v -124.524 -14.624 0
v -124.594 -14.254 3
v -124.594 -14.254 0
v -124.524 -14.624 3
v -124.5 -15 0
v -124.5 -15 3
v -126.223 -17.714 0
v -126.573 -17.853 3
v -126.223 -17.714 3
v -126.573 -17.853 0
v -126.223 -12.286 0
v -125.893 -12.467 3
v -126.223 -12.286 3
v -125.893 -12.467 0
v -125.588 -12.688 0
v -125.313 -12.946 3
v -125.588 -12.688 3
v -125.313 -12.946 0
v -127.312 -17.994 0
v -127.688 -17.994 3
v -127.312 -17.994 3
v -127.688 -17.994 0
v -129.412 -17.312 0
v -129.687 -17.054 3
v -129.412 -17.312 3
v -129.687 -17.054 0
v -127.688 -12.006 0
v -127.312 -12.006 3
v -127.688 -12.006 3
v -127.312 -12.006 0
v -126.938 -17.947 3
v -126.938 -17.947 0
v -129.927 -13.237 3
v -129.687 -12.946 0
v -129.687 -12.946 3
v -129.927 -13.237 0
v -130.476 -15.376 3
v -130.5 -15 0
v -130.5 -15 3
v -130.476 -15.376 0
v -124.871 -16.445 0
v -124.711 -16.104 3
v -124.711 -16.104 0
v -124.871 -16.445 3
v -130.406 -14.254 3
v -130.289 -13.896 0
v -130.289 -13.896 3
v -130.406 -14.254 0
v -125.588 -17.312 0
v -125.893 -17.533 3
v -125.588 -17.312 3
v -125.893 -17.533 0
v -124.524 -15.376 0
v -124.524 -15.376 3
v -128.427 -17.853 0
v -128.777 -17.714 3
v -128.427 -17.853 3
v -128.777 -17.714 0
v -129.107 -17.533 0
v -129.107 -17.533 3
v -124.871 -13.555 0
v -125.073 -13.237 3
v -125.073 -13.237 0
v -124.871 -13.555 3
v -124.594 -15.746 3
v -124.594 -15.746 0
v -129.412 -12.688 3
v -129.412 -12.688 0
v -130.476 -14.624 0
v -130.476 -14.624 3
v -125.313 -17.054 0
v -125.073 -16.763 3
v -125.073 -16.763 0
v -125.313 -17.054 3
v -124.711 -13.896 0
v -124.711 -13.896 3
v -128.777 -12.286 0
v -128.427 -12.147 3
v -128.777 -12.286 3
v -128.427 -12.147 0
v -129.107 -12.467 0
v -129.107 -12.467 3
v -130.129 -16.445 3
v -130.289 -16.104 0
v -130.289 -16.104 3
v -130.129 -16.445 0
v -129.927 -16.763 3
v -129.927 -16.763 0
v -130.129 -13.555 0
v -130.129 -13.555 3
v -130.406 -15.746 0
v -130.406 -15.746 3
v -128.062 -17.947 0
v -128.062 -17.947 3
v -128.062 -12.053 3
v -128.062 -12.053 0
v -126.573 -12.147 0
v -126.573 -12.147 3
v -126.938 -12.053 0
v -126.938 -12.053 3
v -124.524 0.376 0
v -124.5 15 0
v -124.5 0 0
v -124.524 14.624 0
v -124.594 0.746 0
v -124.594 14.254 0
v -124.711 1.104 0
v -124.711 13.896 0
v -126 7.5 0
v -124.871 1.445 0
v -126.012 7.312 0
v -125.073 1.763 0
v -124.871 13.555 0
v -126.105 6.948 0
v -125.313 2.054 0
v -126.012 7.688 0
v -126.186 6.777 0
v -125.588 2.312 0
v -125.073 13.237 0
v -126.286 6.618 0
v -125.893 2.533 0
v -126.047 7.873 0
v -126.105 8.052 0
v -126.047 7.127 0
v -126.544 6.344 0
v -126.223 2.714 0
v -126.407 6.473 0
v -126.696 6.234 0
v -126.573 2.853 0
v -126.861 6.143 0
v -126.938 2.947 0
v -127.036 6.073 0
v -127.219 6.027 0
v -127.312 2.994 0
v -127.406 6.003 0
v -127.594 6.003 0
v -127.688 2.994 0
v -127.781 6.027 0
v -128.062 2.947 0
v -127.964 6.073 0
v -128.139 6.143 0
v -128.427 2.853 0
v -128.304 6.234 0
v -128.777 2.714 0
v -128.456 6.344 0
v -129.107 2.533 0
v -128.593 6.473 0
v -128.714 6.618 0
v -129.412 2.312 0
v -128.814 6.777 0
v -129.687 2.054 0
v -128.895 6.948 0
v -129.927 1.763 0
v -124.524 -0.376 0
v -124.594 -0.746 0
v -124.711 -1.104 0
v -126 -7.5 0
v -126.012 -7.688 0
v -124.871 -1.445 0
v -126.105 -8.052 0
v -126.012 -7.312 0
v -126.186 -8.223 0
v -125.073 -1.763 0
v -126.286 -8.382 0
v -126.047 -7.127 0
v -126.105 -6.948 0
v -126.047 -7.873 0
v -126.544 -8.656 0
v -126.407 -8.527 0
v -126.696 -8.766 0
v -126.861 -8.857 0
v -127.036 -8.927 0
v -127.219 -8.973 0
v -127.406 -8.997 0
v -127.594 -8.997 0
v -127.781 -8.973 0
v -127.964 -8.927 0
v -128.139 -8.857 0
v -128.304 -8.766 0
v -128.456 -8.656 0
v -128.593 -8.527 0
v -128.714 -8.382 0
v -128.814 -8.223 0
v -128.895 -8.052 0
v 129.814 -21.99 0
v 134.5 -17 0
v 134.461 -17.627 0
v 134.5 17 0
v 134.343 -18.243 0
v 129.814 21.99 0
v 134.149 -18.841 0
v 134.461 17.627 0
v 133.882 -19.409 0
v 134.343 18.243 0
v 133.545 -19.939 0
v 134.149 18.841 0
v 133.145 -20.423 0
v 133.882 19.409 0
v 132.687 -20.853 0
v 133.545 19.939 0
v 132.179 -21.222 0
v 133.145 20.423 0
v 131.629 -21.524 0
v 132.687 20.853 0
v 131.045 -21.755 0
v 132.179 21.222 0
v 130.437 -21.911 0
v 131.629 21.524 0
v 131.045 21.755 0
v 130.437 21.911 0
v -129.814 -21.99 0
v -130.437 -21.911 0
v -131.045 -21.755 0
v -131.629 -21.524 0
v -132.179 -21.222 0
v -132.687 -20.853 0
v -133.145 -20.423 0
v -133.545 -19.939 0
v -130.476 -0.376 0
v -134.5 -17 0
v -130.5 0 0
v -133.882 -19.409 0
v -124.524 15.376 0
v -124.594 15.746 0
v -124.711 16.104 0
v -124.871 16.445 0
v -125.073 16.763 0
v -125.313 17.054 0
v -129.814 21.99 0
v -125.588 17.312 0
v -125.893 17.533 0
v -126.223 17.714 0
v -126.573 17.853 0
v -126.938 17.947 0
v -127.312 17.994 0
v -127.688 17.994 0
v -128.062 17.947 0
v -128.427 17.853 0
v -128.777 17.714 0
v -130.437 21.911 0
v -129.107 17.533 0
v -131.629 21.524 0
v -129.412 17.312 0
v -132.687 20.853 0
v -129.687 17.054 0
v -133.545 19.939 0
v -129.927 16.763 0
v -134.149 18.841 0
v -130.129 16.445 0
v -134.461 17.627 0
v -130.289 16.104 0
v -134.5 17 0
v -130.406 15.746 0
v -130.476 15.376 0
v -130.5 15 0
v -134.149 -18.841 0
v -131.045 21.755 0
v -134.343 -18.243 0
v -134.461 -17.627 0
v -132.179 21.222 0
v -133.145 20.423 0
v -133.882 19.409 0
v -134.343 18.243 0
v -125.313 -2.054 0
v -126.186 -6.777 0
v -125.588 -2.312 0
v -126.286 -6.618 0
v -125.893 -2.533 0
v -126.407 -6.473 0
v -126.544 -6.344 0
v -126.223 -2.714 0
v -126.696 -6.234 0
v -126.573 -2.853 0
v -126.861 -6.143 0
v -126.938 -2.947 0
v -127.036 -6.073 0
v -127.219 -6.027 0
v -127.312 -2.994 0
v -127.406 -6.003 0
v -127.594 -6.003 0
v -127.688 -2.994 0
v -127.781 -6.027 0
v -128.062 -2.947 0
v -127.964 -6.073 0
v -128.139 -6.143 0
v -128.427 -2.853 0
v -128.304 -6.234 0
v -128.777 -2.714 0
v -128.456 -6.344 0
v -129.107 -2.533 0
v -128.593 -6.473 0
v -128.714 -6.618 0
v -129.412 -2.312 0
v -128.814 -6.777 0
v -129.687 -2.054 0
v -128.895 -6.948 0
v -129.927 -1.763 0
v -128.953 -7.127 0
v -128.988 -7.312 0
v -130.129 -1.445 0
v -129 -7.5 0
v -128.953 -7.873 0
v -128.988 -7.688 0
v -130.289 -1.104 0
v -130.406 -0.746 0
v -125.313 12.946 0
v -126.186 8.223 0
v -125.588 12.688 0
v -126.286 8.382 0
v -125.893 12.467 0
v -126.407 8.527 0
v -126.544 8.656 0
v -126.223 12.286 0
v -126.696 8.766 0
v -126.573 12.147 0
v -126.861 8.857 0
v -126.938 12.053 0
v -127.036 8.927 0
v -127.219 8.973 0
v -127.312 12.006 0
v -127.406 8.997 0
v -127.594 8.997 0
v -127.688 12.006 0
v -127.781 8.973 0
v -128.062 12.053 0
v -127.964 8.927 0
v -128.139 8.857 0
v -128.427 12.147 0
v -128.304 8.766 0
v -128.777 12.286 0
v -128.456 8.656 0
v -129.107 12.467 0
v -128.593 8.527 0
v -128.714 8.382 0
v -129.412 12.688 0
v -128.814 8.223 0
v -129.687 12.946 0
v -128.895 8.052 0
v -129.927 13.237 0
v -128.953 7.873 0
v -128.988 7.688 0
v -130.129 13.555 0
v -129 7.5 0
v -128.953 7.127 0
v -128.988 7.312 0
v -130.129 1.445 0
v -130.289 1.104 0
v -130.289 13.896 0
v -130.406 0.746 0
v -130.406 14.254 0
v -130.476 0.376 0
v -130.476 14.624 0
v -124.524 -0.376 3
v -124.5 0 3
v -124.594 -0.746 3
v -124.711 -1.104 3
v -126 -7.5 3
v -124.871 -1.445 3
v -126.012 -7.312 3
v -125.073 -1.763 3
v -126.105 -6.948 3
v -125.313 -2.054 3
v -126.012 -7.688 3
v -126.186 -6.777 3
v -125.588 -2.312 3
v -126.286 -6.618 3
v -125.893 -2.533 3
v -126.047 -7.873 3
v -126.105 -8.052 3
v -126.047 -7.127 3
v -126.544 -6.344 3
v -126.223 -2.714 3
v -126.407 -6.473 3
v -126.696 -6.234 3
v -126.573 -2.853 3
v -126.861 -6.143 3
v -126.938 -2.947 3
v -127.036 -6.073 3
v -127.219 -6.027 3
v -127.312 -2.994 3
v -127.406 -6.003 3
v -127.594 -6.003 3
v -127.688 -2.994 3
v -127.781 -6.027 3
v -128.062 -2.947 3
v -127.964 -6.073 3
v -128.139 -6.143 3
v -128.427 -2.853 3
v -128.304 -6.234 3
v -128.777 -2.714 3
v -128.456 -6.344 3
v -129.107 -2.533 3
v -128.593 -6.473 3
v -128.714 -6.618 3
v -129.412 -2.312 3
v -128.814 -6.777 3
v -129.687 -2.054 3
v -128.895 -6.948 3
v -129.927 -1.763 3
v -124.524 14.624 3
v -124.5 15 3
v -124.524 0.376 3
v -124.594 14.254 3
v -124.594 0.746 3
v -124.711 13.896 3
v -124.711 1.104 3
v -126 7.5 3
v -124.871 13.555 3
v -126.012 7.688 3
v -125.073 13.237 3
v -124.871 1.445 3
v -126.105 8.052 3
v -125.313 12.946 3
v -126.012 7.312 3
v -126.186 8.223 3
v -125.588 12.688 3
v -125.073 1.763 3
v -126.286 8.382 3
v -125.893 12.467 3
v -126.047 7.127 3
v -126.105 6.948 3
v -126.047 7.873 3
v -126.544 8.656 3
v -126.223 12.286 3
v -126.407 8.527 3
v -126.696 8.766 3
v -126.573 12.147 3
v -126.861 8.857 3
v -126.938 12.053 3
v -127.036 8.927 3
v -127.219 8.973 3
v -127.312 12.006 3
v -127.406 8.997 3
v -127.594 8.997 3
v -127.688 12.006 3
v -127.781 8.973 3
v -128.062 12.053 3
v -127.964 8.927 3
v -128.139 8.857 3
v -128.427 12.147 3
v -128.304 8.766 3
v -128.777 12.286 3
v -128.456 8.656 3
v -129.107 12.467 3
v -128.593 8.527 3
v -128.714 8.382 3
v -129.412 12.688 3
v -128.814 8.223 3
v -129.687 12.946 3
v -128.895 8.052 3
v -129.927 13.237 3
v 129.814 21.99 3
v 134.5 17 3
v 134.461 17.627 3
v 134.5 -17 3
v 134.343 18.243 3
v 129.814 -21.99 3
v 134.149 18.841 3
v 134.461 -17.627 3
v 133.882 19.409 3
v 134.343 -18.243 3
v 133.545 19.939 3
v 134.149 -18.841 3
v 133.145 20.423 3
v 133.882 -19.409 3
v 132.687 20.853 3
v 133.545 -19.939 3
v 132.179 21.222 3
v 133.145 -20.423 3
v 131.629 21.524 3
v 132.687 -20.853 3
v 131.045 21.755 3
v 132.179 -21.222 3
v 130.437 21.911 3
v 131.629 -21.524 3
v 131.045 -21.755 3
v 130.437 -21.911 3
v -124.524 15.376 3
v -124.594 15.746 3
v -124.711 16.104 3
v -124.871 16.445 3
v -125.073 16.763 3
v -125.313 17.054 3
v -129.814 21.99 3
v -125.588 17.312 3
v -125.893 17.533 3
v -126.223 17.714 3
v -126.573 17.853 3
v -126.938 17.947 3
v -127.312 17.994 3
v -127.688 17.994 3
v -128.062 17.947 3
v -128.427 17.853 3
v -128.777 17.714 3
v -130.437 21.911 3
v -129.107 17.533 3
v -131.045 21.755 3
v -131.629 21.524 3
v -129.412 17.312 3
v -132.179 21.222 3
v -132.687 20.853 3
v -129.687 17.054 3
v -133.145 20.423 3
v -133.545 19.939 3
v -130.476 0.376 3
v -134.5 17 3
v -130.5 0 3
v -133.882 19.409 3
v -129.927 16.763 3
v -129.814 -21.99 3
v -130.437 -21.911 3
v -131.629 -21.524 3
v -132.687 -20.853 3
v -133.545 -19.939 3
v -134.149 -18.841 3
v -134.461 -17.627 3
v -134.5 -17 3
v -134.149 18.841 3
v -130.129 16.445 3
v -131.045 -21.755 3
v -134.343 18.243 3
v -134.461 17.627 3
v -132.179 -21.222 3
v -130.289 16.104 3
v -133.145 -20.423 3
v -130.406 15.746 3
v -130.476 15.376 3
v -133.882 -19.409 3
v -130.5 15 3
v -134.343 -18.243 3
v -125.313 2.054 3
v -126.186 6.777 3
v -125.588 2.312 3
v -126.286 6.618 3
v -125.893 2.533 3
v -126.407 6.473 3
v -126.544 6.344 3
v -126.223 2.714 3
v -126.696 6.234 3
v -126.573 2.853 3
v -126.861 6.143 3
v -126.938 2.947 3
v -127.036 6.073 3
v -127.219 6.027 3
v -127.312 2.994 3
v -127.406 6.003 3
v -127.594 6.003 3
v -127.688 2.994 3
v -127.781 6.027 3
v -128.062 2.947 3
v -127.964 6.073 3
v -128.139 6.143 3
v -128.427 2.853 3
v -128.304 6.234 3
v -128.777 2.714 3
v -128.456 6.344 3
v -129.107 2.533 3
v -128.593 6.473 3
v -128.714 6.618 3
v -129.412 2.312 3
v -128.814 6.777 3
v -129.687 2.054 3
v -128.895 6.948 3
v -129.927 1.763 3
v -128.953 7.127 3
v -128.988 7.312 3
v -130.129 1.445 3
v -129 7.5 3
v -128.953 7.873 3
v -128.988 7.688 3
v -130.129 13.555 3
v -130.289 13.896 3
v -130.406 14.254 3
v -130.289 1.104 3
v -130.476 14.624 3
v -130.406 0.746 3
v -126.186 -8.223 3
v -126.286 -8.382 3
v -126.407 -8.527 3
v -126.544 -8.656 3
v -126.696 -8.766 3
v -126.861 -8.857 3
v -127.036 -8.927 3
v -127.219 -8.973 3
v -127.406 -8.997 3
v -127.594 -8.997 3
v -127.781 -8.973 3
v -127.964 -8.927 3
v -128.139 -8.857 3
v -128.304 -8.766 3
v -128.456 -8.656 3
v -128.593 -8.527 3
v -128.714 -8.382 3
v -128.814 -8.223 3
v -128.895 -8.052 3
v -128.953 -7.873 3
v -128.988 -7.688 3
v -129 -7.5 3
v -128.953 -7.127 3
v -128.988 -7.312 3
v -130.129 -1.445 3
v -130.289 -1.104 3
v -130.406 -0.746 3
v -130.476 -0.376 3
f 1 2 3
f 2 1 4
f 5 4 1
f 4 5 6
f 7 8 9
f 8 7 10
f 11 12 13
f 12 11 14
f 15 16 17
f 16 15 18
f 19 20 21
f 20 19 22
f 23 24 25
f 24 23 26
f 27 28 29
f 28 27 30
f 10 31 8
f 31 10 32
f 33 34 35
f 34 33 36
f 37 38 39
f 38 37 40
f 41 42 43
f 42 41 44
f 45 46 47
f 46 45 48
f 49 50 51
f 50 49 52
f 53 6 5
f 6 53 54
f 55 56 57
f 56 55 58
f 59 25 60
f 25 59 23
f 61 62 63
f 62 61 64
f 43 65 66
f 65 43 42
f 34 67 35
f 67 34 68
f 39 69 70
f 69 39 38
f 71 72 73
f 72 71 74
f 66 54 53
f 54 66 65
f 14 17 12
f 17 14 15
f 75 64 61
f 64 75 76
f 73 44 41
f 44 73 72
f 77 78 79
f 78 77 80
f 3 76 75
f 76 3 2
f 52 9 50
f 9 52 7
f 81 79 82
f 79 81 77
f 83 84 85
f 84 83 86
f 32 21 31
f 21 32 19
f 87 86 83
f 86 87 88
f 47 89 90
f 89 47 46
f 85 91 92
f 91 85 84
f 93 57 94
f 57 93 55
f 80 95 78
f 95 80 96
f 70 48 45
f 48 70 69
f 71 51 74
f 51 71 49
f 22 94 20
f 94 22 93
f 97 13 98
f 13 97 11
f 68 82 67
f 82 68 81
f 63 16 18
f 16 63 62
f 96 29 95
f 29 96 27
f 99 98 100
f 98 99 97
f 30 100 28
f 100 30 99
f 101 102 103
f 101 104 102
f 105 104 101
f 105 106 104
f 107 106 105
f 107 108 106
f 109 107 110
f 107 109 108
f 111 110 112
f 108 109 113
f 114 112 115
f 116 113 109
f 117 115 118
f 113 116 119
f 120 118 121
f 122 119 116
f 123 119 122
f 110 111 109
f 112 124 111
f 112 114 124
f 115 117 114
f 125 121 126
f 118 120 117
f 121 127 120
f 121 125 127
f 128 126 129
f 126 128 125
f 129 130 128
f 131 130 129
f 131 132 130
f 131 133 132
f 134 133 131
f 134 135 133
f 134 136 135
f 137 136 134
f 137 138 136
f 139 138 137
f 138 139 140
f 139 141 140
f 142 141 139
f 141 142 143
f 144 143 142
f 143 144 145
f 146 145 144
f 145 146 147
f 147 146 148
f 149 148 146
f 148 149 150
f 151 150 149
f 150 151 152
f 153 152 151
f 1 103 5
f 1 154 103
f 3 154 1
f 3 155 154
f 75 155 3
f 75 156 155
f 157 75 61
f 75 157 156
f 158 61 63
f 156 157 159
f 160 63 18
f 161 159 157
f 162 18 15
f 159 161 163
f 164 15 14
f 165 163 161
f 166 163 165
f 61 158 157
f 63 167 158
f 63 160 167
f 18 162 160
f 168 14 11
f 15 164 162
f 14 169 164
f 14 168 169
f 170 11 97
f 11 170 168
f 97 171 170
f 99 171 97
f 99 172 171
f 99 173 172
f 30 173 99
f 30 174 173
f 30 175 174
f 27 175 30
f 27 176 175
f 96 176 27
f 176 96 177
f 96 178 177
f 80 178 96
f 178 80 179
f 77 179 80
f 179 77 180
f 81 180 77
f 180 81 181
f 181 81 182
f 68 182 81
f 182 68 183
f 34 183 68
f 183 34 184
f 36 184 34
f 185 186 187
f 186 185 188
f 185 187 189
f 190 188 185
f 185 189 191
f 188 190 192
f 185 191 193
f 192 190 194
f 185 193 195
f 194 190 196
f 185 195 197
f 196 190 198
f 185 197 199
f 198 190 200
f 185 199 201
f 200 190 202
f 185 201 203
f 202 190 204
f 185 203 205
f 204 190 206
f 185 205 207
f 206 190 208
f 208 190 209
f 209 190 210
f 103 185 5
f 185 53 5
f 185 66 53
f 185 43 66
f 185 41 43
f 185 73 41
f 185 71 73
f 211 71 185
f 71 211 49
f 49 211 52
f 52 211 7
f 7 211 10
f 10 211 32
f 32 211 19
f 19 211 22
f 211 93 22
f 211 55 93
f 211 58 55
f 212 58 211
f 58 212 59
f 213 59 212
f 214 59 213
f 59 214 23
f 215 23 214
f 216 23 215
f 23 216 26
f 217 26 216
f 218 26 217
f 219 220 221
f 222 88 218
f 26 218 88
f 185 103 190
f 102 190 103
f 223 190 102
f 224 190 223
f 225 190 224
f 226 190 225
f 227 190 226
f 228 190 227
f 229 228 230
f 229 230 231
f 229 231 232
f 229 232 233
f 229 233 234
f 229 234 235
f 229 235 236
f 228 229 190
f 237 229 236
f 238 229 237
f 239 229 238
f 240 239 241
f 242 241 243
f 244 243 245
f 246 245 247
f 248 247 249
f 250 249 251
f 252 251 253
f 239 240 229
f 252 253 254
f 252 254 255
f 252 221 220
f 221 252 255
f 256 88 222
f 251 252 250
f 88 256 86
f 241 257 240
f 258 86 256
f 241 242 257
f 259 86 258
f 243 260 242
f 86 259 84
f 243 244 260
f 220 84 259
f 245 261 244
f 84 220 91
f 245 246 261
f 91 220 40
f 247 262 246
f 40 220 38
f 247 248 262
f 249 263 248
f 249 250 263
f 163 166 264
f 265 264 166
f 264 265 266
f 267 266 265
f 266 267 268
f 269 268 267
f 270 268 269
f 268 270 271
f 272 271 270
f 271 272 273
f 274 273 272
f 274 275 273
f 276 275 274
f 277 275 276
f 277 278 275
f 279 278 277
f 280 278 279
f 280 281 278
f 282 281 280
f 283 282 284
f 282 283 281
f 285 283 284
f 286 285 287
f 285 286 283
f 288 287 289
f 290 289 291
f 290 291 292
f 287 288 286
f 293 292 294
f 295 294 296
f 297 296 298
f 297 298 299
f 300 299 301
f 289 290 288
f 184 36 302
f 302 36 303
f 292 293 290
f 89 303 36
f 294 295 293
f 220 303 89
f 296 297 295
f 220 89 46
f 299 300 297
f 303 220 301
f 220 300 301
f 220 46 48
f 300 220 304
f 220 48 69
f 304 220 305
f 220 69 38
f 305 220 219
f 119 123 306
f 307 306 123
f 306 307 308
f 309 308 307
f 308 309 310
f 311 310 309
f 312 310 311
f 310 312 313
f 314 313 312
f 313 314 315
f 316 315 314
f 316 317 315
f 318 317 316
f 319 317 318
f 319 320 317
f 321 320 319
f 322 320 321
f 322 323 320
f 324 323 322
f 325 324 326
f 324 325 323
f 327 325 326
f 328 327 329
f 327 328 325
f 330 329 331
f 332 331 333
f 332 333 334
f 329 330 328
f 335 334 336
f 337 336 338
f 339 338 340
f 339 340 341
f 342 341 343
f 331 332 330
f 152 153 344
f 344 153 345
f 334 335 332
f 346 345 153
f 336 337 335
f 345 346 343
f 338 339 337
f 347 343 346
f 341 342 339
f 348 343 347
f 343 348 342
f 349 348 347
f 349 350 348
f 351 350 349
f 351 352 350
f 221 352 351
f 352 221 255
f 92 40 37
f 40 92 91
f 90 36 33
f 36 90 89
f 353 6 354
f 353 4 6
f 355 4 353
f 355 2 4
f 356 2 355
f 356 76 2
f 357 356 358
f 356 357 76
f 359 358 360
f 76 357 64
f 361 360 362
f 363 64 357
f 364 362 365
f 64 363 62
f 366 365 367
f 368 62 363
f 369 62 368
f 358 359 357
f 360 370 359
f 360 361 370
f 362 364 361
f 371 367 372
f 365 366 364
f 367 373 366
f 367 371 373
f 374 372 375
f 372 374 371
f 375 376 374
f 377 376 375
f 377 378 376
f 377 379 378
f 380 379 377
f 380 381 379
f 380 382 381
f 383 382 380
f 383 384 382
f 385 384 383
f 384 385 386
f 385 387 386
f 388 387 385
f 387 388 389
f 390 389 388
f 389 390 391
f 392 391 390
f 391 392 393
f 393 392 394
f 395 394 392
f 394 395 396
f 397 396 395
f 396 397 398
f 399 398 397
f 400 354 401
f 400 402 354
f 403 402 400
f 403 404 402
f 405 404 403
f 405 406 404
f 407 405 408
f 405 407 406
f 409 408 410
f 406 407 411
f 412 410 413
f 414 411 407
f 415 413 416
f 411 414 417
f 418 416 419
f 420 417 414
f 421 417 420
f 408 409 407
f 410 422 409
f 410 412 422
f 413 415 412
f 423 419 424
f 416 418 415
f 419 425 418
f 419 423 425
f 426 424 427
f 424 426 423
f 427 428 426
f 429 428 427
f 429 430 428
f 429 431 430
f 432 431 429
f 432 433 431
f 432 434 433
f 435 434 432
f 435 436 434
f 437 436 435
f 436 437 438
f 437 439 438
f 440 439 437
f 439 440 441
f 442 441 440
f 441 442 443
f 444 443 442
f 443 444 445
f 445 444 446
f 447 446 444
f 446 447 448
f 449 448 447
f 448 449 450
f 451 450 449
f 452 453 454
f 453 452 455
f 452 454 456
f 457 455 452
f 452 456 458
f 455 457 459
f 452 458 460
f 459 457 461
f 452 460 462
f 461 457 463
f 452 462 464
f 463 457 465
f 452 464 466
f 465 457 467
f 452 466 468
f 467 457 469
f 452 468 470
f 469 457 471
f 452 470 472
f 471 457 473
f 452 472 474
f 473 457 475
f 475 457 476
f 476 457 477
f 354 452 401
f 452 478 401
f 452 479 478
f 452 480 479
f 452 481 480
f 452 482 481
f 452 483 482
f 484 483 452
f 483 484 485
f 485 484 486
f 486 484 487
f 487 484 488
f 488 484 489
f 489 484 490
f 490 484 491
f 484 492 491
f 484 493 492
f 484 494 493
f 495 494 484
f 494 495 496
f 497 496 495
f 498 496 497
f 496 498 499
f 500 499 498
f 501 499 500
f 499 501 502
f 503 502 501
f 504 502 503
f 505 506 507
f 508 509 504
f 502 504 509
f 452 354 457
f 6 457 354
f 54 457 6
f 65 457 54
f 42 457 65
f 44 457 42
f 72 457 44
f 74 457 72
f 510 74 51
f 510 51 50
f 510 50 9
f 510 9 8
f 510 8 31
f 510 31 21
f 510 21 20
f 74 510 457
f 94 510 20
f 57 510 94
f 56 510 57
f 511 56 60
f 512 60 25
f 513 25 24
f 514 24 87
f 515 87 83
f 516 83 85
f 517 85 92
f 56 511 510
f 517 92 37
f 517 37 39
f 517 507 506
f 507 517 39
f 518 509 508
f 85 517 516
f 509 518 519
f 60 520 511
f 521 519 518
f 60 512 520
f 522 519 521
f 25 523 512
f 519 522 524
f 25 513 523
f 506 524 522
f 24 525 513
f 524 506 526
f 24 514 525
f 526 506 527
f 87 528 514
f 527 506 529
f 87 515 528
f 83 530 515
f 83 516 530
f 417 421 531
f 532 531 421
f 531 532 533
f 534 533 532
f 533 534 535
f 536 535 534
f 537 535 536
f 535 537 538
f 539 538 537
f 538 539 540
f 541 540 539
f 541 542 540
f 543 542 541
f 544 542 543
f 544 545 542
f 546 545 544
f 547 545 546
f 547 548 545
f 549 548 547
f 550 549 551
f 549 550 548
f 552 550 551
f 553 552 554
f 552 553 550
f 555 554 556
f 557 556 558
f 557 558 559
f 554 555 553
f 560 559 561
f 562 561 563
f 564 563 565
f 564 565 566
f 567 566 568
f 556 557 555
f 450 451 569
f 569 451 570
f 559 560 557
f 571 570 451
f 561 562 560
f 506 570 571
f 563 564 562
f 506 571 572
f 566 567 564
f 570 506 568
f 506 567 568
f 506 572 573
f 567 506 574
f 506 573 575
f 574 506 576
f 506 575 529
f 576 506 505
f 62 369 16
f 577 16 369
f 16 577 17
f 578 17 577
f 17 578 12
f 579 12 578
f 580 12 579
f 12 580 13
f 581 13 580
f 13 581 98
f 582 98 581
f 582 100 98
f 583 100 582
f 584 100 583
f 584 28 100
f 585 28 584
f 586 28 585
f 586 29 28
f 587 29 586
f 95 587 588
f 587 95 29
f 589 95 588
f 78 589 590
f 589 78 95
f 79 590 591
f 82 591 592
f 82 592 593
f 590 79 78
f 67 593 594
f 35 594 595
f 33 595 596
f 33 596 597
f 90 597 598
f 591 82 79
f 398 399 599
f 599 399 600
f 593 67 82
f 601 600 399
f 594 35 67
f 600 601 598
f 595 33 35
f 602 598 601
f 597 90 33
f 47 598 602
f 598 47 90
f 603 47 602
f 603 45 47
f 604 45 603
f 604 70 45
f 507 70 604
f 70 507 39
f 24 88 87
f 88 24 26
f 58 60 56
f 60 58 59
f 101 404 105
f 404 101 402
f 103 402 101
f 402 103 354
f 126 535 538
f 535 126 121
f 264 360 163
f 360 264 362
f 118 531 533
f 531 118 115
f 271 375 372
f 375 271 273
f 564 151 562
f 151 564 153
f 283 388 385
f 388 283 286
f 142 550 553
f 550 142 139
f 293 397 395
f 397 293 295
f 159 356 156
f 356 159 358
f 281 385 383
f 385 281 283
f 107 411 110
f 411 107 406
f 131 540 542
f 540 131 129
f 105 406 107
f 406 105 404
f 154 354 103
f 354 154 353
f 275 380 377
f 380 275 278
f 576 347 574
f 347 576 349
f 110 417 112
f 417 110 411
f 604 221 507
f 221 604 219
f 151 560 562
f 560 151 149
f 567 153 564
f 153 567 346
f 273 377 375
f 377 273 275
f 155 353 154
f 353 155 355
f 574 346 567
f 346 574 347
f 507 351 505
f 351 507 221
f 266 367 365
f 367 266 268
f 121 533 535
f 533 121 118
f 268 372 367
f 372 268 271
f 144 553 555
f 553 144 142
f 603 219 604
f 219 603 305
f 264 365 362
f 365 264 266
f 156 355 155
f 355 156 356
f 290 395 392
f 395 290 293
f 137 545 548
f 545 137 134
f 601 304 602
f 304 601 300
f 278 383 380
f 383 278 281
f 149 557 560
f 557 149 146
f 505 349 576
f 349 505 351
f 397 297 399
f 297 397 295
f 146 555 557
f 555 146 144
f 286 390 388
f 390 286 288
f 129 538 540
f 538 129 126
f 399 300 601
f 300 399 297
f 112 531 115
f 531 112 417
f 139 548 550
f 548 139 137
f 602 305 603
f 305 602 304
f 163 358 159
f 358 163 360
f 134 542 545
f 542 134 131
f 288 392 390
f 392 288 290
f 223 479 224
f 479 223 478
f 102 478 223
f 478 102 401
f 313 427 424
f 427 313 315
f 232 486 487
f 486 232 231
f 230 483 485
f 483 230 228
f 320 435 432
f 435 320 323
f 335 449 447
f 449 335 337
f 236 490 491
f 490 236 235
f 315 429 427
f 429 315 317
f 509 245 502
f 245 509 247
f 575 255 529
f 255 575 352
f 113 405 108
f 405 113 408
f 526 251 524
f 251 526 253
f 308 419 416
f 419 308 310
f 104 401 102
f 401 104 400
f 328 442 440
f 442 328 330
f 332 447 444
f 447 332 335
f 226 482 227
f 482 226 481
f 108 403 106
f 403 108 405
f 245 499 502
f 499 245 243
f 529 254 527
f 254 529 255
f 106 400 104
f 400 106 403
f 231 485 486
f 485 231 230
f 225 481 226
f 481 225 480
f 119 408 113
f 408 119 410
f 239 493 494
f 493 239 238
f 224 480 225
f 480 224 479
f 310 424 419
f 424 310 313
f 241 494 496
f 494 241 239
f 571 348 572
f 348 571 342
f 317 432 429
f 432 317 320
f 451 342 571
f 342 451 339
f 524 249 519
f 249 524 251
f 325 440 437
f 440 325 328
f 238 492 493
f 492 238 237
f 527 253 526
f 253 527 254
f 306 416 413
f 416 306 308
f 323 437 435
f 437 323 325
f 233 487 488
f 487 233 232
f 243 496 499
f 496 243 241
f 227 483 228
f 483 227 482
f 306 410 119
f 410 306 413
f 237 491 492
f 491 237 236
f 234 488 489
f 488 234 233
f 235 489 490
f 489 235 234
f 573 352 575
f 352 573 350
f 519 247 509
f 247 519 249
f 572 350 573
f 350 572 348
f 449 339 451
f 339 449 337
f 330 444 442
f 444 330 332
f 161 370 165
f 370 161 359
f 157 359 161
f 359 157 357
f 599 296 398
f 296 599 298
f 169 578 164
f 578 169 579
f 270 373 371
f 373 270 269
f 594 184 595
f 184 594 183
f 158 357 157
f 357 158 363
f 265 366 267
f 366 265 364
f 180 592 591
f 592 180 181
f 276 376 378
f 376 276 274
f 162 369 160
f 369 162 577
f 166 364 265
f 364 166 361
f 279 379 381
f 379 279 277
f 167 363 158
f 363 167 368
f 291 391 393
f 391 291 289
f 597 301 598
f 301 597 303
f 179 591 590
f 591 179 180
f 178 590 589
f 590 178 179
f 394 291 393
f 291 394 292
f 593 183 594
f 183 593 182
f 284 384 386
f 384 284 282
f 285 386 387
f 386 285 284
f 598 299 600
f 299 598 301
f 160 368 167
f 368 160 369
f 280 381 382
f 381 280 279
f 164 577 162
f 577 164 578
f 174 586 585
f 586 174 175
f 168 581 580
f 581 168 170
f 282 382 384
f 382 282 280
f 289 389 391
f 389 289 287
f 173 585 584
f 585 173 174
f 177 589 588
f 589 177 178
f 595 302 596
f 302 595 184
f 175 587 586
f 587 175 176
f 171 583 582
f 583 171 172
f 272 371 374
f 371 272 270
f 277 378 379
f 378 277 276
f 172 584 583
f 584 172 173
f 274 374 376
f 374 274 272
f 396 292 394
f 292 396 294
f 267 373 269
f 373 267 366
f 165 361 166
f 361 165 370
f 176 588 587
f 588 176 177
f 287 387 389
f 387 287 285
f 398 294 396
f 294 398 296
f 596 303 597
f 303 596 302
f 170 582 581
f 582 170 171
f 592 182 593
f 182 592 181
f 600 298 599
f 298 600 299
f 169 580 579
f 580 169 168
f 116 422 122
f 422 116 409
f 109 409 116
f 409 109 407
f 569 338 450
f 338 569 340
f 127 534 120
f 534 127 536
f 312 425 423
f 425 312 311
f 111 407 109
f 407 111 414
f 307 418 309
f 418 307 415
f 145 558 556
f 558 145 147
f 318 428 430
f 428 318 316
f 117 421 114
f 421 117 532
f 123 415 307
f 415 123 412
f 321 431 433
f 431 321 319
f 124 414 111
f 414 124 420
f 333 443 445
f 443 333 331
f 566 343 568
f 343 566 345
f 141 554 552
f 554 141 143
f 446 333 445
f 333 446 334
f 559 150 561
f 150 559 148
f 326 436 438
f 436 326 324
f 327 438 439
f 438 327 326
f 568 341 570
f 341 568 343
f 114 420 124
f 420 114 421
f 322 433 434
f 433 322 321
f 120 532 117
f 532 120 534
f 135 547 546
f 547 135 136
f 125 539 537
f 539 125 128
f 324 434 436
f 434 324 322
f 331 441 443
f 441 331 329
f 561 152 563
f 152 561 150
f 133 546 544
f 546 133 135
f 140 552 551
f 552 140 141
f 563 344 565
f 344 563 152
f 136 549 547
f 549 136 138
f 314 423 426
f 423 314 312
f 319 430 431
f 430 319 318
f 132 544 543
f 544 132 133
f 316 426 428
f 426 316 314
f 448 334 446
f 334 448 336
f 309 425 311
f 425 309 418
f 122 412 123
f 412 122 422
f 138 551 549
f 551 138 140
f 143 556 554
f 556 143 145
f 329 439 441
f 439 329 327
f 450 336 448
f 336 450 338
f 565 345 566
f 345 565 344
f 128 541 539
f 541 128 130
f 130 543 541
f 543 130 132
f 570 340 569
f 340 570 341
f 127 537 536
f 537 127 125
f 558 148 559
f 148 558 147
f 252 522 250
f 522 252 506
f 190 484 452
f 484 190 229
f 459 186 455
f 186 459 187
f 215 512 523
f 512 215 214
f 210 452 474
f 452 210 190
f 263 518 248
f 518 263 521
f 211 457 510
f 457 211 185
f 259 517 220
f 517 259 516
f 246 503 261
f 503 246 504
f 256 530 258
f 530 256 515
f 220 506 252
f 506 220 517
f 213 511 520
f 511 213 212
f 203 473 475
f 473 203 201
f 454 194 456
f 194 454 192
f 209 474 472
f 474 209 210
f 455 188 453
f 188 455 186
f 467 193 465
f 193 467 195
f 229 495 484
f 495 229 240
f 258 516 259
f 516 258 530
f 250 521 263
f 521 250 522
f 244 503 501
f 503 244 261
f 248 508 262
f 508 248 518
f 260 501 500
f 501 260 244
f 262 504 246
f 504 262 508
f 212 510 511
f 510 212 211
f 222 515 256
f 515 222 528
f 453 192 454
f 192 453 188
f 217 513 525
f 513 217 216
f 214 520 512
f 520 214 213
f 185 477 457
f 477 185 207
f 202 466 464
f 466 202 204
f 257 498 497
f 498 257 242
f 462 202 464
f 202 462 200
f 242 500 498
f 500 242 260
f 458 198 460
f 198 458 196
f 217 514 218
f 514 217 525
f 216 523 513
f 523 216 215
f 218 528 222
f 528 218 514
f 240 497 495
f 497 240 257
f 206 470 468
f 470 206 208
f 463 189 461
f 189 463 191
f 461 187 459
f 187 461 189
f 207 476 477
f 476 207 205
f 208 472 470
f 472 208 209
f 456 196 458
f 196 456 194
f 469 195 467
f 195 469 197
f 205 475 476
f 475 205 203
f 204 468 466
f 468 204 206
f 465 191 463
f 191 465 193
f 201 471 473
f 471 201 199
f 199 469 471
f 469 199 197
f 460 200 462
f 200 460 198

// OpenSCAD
$fn = 50;


difference() {
	union() {
		hull() {
			translate(v = [-129.5000000000, 17.0000000000, 0]) {
				cylinder(h = 3, r = 5);
			}
			translate(v = [129.5000000000, 17.0000000000, 0]) {
				cylinder(h = 3, r = 5);
			}
			translate(v = [-129.5000000000, -17.0000000000, 0]) {
				cylinder(h = 3, r = 5);
			}
			translate(v = [129.5000000000, -17.0000000000, 0]) {
				cylinder(h = 3, r = 5);
			}
		}
	}
	union() {
		translate(v = [-127.5000000000, -15.0000000000, 0]) {
			cylinder(h = 3, r = 3.0000000000);
		}
		translate(v = [-127.5000000000, 0.0000000000, 0]) {
			cylinder(h = 3, r = 3.0000000000);
		}
		translate(v = [-127.5000000000, 15.0000000000, 0]) {
			cylinder(h = 3, r = 3.0000000000);
		}
		translate(v = [-127.5000000000, -15.0000000000, 0]) {
			cylinder(h = 3, r = 1.5000000000);
		}
		translate(v = [-127.5000000000, -7.5000000000, 0]) {
			cylinder(h = 3, r = 1.5000000000);
		}
		translate(v = [-127.5000000000, 0.0000000000, 0]) {
			cylinder(h = 3, r = 1.5000000000);
		}
		translate(v = [-127.5000000000, 7.5000000000, 0]) {
			cylinder(h = 3, r = 1.5000000000);
		}
		translate(v = [-127.5000000000, 15.0000000000, 0]) {
			cylinder(h = 3, r = 1.5000000000);
		}
		translate(v = [-127.5000000000, -15.0000000000, 0]) {
			cylinder(h = 3, r = 1.5000000000);
		}
		translate(v = [-127.5000000000, -7.5000000000, 0]) {
			cylinder(h = 3, r = 1.5000000000);
		}
		translate(v = [-127.5000000000, 0.0000000000, 0]) {
			cylinder(h = 3, r = 1.5000000000);
		}
		translate(v = [-127.5000000000, 7.5000000000, 0]) {
			cylinder(h = 3, r = 1.5000000000);
		}
		translate(v = [-127.5000000000, 15.0000000000, 0]) {
			cylinder(h = 3, r = 1.5000000000);
		}
		translate(v = [-127.5000000000, -15.0000000000, 0]) {
			cylinder(h = 3, r = 1.5000000000);
		}
		translate(v = [-127.5000000000, -7.5000000000, 0]) {
			cylinder(h = 3, r = 1.5000000000);
		}
		translate(v = [-127.5000000000, 0.0000000000, 0]) {
			cylinder(h = 3, r = 1.5000000000);
		}
		translate(v = [-127.5000000000, 7.5000000000, 0]) {
			cylinder(h = 3, r = 1.5000000000);
		}
		translate(v = [-127.5000000000, 15.0000000000, 0]) {
			cylinder(h = 3, r = 1.5000000000);
		}
	}
}
